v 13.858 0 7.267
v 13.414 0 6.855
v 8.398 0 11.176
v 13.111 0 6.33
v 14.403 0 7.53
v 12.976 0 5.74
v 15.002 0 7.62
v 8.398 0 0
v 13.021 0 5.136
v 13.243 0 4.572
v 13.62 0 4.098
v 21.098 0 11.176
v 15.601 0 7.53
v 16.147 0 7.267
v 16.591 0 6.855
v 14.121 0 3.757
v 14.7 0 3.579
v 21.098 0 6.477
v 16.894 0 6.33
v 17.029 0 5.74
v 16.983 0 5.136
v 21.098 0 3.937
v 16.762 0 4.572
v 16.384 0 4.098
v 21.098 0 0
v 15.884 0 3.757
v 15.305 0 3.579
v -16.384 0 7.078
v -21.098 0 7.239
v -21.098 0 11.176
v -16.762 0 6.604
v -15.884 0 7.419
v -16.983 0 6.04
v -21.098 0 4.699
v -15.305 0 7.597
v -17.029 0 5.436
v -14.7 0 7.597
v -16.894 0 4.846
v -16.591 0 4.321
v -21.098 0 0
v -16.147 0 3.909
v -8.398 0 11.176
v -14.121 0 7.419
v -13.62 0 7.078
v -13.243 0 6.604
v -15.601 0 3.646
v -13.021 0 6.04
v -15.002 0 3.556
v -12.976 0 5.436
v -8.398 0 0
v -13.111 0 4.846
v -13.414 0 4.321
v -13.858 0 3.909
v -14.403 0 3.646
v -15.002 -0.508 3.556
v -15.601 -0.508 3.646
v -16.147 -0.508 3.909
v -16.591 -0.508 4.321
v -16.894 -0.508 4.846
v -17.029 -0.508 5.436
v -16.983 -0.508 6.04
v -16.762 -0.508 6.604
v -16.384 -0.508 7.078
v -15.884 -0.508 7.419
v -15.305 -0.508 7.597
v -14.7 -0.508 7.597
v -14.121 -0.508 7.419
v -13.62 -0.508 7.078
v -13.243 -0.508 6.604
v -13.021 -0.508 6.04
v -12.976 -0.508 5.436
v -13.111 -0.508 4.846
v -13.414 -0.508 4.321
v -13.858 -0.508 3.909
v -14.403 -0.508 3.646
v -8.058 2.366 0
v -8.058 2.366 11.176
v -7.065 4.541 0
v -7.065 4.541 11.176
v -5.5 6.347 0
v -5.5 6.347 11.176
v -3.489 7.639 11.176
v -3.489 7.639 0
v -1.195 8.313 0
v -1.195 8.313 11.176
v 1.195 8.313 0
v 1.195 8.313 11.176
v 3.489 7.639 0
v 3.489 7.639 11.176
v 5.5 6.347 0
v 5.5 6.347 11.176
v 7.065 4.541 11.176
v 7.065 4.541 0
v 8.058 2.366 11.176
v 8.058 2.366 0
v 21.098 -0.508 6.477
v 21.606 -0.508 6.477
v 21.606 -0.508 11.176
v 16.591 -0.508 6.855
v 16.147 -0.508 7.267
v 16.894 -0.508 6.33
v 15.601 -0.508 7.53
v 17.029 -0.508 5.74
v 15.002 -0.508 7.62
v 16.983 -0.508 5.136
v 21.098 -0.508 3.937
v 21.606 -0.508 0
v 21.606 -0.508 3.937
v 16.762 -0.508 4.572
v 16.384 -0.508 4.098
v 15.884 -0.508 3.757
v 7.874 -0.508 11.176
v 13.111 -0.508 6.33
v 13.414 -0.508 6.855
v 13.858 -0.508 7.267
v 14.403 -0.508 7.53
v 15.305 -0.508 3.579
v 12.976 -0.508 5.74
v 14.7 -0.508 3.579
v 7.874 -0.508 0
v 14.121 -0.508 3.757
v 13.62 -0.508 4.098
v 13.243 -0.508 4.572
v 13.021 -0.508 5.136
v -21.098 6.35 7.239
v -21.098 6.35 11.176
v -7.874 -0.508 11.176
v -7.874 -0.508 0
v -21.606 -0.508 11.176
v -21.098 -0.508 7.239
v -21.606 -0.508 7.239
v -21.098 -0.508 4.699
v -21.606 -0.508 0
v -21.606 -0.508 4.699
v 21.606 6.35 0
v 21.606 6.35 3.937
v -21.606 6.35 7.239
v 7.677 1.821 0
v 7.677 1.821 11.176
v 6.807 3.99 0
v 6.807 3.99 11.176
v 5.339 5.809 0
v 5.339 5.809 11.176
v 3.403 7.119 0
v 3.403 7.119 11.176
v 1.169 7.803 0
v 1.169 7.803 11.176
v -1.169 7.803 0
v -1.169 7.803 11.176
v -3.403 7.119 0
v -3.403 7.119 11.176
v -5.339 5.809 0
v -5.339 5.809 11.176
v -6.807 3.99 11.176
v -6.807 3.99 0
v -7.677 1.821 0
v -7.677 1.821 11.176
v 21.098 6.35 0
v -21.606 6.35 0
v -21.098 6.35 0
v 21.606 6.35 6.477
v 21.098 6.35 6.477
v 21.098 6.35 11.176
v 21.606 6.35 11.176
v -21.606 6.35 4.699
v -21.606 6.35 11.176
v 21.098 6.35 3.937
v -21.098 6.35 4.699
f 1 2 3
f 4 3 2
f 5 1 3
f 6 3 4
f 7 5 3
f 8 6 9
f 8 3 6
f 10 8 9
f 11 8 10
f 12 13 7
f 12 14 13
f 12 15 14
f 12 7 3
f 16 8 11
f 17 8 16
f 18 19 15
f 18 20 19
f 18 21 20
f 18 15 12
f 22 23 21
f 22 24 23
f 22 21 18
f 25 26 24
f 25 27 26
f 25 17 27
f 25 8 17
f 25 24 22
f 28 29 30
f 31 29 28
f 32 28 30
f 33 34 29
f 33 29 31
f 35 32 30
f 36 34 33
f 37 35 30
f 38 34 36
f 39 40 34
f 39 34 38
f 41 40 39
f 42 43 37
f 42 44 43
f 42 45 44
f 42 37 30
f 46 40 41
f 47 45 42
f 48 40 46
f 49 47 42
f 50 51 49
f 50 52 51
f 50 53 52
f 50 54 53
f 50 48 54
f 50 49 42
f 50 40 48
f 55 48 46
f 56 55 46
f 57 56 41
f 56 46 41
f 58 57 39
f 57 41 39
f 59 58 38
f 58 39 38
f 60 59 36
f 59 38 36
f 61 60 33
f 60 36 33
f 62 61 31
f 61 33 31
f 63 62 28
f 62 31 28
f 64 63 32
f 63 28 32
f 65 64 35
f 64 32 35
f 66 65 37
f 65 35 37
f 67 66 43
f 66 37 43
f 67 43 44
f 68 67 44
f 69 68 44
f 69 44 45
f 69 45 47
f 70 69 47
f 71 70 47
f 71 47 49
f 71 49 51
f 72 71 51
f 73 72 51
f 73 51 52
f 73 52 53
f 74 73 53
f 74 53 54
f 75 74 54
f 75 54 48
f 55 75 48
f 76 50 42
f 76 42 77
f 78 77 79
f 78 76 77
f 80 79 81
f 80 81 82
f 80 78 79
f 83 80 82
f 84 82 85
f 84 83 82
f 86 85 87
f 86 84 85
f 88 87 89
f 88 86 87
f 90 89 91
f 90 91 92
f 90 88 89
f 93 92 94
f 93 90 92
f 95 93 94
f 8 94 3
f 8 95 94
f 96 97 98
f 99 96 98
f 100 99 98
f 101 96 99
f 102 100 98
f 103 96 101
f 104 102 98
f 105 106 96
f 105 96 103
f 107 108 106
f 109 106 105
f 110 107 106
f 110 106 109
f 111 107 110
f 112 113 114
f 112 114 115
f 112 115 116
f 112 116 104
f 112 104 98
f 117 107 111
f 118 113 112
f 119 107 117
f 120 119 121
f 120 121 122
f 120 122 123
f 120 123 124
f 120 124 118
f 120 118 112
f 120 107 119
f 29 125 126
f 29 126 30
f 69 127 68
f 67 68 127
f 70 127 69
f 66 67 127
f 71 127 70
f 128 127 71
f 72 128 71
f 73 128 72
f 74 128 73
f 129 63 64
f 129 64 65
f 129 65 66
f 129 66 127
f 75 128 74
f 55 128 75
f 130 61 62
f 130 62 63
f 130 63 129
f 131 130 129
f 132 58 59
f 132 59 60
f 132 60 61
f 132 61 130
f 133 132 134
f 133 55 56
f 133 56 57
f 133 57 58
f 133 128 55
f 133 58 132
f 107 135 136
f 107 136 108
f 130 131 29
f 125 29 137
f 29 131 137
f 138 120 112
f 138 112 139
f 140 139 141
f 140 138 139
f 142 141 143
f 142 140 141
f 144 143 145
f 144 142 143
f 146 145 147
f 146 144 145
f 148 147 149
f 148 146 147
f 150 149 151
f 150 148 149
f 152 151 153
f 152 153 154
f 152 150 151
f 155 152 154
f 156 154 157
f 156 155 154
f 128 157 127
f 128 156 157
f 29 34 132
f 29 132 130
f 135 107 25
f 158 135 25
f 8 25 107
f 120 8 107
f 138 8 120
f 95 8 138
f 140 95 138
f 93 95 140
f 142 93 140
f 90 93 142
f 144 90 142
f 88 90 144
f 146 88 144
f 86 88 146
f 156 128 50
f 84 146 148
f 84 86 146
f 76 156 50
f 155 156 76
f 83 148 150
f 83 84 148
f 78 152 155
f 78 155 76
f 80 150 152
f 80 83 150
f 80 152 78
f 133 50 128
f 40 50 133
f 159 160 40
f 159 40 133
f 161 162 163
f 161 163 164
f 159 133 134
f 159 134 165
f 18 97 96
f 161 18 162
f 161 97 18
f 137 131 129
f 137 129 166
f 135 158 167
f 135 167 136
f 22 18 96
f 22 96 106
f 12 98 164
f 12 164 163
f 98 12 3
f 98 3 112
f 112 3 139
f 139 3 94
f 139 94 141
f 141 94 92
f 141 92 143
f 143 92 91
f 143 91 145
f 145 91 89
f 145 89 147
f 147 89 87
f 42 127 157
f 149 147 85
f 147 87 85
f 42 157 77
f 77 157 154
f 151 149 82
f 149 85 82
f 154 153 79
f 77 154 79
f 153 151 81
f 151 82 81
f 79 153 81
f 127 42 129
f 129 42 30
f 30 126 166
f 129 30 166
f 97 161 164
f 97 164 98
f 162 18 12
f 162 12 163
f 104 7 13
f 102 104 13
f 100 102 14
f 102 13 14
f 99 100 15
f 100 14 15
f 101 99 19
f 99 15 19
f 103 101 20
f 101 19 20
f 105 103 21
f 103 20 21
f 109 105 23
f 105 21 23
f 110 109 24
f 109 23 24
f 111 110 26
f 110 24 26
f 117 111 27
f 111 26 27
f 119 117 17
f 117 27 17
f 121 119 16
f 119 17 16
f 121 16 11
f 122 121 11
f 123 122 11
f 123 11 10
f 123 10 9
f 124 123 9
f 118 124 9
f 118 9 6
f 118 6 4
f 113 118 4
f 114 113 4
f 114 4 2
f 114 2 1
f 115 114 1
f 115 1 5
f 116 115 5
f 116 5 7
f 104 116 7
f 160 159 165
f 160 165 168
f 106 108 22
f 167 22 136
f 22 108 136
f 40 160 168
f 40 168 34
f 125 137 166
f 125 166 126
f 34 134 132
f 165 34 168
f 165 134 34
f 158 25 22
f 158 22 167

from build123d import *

# Parameters (mm, degrees)
BOSS_EXTRUDE1_DEPTH = 11.176
SKETCH2_R           = 2.032
CUT_EXTRUDE1_DEPTH  = 26.73462306
SKETCH4_W           = 2.54
SKETCH4_H           = 6.858
CUT_EXTRUDE2_DEPTH  = 0.508
SKETCH5_W           = 2.54
SKETCH5_H           = 6.858
CUT_EXTRUDE3_DEPTH  = 0.508


with BuildPart() as part:
    # Sketch1 → Boss-Extrude1 (new body)
    with BuildSketch(Plane.XY):
        with BuildLine():
            Line((8.39837008, 0), (21.09837008, 0))
            Line((21.09837008, 0), (21.09837008, 6.35))
            Line((21.09837008, 6.35), (21.60637008, 6.35))
            Line((21.60637008, 6.35), (21.60637008, -0.508))
            Line((21.60637008, -0.508), (7.874, -0.508))
            ThreePointArc((7.874, -0.508), (0, 7.89037008), (-7.874, -0.508))
            Line((-7.874, -0.508), (-21.60637008, -0.508))
            Line((-21.60637008, -0.508), (-21.60637008, 6.35))
            Line((-21.60637008, 6.35), (-21.09837008, 6.35))
            Line((-21.09837008, 6.35), (-21.09837008, 0))
            Line((-21.09837008, 0), (-8.39837008, 0))
            ThreePointArc((-8.39837008, 0), (0, 8.39837008), (8.39837008, 0))
        make_face()
    extrude(amount=BOSS_EXTRUDE1_DEPTH)

    # Sketch2 → Cut-Extrude1 (cut, through all)
    with BuildSketch(Plane(origin=(0, 0, 0), x_dir=(1, 0, 0), z_dir=(0, 1, 0))):
        with Locations(Location((15.00237008, -5.588, 0), (0, 0, 270))):
            Circle(SKETCH2_R)
        with Locations(Location((-15.00237008, -5.588, 0), (0, 0, 90))):
            Circle(SKETCH2_R)
    extrude(amount=-CUT_EXTRUDE1_DEPTH, mode=Mode.SUBTRACT)

    # Sketch4 → Cut-Extrude2 (cut)
    with BuildSketch(Plane(origin=(21.60637008, 0, 0), x_dir=(0, 0, -1), z_dir=(1, 0, 0))):
        with Locations((-5.207, 2.921)):
            Rectangle(SKETCH4_W, SKETCH4_H)
    extrude(amount=-CUT_EXTRUDE2_DEPTH, mode=Mode.SUBTRACT)

    # Sketch5 → Cut-Extrude3 (cut)
    with BuildSketch(Plane.ZY.offset(21.60637008)):
        with Locations((5.969, 2.921)):
            Rectangle(SKETCH5_W, SKETCH5_H)
    extrude(amount=-CUT_EXTRUDE3_DEPTH, mode=Mode.SUBTRACT)


solid = part.part
